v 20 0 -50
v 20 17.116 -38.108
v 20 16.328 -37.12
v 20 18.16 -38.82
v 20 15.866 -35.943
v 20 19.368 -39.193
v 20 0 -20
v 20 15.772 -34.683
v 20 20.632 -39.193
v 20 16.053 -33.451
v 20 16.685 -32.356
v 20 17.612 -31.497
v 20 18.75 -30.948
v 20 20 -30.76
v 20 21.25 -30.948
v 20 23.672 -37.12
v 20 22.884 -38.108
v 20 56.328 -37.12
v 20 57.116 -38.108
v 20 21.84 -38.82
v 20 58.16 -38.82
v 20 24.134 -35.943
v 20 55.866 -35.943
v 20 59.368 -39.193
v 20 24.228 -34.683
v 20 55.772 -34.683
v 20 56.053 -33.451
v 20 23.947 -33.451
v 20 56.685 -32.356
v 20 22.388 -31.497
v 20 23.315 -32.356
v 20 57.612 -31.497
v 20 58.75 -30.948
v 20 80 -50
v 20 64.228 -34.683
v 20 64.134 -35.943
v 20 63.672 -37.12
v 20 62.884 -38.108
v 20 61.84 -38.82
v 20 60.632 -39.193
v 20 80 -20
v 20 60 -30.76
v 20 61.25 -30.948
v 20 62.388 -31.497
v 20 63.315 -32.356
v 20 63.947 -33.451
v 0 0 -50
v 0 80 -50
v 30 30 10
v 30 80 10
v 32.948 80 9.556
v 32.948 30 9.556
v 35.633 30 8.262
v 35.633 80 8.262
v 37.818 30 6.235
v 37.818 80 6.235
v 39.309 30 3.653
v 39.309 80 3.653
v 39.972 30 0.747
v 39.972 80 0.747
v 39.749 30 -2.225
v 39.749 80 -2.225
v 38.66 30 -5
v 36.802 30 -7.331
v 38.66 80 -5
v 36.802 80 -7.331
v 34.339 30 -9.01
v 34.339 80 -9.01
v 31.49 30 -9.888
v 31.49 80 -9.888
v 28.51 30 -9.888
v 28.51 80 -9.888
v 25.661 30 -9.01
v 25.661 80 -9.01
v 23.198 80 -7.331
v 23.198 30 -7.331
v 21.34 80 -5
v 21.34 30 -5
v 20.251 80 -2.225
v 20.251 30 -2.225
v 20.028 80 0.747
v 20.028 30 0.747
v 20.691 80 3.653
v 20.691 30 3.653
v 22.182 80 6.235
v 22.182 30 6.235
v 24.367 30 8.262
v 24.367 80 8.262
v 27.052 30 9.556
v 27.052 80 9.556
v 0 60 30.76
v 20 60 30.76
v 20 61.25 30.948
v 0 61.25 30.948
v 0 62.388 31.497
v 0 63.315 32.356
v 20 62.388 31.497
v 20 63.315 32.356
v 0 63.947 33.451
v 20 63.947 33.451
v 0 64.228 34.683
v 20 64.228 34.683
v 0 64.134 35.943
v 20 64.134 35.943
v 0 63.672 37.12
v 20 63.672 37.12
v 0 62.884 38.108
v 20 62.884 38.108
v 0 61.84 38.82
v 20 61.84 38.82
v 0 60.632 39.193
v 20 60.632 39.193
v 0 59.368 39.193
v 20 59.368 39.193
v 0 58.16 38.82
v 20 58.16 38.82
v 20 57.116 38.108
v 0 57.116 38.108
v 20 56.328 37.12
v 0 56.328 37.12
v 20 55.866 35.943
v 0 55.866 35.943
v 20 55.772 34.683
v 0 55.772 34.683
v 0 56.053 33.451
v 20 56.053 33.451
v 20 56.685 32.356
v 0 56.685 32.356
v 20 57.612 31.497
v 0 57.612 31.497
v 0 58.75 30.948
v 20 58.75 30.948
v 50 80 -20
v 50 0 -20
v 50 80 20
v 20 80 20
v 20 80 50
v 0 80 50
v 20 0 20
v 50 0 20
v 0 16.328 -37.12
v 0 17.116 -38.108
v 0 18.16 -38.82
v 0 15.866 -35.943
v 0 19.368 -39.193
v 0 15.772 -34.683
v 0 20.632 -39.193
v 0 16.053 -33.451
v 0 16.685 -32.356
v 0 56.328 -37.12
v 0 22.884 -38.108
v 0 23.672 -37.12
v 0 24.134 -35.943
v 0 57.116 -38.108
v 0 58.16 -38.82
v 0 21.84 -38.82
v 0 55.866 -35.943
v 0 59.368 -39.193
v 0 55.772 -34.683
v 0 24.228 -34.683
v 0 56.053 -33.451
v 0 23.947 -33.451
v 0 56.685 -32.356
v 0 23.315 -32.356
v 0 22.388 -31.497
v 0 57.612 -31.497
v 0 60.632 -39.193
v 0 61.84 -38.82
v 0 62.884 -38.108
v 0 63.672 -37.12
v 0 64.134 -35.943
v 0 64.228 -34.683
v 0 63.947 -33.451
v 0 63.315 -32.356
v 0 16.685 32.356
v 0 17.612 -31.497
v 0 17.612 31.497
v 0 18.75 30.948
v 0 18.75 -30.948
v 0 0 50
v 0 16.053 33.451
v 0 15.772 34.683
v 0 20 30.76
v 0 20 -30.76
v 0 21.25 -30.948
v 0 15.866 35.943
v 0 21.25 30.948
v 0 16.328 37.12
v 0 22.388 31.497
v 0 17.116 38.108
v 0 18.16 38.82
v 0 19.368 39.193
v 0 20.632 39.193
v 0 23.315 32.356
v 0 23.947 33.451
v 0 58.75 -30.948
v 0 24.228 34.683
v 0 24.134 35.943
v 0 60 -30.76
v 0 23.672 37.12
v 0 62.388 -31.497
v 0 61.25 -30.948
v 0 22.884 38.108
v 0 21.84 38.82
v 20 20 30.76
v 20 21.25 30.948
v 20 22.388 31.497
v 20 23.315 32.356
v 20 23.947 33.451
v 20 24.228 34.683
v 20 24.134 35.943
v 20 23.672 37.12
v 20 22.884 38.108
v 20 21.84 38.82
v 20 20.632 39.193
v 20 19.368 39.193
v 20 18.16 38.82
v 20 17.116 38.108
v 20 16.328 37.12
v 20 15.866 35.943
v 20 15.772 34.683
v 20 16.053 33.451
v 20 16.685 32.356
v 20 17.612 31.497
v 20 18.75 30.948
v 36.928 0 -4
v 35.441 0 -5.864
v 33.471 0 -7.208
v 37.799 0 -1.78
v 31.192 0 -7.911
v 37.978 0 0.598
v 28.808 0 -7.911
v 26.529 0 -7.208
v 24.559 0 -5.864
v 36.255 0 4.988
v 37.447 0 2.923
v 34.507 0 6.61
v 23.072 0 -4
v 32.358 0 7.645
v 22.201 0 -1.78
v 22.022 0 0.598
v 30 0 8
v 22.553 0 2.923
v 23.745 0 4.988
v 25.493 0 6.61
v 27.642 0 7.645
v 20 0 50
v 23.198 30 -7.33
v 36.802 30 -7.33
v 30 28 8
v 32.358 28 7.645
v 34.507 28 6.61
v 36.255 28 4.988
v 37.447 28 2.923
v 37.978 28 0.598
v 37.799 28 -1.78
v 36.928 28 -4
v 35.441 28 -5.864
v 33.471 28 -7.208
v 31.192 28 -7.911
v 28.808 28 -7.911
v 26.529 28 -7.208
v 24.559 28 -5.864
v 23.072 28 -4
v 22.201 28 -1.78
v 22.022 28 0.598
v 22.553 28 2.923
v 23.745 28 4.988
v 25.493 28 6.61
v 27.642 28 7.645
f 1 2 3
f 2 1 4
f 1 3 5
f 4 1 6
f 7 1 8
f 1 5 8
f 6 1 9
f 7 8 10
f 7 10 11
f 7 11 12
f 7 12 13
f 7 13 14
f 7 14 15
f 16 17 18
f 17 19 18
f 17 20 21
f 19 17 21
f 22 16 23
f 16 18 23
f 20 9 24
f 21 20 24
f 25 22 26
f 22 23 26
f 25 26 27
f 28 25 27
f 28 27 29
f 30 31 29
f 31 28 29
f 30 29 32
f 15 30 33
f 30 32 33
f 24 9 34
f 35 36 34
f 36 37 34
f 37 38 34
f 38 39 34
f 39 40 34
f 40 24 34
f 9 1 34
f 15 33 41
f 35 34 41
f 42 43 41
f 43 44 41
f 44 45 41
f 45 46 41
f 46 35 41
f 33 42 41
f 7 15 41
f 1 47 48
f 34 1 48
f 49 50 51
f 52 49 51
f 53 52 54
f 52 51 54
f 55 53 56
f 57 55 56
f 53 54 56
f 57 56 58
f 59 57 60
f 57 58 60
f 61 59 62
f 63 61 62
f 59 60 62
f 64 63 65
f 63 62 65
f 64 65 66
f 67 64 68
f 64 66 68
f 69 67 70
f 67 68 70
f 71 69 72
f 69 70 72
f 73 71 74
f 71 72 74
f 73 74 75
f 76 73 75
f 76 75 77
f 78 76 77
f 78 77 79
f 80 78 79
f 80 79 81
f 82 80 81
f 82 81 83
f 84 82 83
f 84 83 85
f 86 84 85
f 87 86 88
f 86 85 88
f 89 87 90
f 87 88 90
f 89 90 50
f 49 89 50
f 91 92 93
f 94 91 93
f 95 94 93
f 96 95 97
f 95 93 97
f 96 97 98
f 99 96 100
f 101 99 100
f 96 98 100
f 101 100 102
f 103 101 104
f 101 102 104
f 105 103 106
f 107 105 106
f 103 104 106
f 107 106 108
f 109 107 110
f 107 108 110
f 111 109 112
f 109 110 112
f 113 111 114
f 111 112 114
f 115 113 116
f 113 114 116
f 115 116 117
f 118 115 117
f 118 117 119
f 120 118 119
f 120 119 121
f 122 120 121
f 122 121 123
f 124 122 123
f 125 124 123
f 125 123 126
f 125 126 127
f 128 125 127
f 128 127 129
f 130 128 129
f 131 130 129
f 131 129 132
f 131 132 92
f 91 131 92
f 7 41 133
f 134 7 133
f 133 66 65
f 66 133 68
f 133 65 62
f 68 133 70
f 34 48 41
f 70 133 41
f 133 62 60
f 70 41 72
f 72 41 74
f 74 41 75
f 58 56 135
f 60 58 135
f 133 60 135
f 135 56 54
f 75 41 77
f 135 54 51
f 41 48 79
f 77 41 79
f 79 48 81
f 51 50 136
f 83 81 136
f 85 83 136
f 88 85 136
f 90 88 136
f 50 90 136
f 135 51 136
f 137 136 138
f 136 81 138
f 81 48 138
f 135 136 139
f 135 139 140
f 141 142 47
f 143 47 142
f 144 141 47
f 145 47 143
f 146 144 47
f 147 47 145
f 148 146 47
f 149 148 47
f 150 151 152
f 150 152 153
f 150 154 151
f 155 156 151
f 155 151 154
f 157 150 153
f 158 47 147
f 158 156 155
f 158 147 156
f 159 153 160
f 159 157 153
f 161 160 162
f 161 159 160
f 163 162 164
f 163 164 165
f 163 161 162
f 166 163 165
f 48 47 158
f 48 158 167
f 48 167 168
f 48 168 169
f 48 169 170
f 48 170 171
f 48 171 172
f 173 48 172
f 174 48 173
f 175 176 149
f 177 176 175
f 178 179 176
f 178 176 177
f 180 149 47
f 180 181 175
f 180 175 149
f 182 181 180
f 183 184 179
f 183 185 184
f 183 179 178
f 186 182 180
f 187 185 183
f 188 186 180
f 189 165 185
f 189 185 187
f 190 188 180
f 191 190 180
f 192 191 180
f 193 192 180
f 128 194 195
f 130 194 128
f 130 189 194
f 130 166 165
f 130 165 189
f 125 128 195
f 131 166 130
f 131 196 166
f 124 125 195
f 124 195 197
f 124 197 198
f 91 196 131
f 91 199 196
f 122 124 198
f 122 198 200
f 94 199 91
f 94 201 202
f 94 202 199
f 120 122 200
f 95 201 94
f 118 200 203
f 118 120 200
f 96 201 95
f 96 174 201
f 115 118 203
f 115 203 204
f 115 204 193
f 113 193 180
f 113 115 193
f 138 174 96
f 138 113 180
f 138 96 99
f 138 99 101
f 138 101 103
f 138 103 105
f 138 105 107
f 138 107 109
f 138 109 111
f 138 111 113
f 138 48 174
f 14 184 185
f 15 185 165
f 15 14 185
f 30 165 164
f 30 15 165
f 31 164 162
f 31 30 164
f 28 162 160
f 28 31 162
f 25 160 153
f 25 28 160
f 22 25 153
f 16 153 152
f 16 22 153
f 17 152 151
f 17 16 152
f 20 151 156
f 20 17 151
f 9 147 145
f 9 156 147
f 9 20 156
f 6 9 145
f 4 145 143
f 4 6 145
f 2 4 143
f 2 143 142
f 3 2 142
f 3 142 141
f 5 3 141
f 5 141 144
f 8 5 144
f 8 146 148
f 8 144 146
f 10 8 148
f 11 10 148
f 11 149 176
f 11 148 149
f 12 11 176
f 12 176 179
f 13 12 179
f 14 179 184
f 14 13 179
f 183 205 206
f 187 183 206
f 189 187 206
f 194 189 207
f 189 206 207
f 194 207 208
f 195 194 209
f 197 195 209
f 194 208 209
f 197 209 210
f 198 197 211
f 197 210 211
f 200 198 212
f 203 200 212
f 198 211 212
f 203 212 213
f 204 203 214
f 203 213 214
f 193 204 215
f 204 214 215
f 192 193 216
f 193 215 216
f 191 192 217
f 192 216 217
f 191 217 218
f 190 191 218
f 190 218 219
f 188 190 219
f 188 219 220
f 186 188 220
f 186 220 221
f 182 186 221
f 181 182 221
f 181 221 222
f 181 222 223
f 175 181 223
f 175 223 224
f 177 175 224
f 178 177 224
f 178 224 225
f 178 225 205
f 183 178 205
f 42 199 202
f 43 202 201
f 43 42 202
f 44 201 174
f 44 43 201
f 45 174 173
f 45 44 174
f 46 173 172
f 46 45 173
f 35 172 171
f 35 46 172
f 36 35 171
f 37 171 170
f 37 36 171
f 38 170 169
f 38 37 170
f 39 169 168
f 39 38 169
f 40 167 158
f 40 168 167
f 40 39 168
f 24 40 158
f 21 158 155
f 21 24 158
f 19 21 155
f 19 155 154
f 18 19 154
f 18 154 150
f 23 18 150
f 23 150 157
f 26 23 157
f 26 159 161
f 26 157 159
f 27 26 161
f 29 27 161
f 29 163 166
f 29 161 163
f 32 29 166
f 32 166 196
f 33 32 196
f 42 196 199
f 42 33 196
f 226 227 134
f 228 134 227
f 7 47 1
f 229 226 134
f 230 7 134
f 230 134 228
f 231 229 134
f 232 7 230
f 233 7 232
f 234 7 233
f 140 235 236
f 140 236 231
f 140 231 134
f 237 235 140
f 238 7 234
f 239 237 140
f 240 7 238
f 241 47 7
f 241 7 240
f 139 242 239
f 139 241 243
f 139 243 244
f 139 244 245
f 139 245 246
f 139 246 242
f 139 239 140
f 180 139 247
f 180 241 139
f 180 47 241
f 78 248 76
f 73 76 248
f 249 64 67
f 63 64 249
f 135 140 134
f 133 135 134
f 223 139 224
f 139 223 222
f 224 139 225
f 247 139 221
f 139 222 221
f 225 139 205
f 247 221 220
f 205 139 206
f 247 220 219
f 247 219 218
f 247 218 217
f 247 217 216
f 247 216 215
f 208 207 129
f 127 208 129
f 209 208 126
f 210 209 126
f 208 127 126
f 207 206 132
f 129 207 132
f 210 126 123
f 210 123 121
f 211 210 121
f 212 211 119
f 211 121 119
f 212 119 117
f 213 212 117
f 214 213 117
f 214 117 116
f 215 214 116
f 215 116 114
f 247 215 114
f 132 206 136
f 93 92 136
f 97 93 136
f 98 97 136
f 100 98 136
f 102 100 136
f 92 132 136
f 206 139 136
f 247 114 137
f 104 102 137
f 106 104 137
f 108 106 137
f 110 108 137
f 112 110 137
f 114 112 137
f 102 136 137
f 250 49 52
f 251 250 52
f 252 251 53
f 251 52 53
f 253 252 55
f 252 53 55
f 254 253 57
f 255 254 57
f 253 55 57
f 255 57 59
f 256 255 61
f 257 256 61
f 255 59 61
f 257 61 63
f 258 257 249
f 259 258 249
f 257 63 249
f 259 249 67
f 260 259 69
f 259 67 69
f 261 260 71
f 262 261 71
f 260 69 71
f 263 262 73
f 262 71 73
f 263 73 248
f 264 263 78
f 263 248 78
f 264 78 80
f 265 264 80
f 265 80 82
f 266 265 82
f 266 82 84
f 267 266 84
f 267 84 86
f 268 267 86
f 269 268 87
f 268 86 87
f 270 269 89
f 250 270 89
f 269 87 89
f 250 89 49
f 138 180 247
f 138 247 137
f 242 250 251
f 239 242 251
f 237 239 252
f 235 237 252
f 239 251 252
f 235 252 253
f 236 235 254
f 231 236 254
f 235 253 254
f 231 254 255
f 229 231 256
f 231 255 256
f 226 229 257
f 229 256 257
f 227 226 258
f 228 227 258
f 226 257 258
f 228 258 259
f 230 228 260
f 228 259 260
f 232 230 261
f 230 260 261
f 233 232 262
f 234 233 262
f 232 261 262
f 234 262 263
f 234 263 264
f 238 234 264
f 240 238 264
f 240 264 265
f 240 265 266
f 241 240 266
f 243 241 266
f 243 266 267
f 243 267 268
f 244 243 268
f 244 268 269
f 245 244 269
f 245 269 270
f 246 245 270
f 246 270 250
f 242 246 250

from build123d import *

# Parameters (mm, degrees)
SKETCH1_W           = 50
SKETCH1_H           = 40
BOSS_EXTRUDE1_DEPTH = 80
SKETCH4_W           = 100
SKETCH4_H           = 80
BOSS_EXTRUDE2_DEPTH = 20
SKETCH5_R           = 4.24
SCREW_HOLE_DEPTH    = 99.994949366
SKETCH6_R           = 8
ROD_HOLE_DEPTH      = 107.77078252
SKETCH7_R           = 10
CUT_EXTRUDE5_DEPTH  = 50
CHAMFER2_SIZE       = 2


with BuildPart() as part:
    # Sketch1 → Boss-Extrude1 (new body)
    with BuildSketch(Plane(origin=(0, 0, 0), x_dir=(1, 0, 0), z_dir=(0, 1, 0))):
        with Locations((25, 0)):
            Rectangle(SKETCH1_W, SKETCH1_H)
    extrude(amount=BOSS_EXTRUDE1_DEPTH)

    # Sketch4 → Boss-Extrude2 (add)
    with BuildSketch(Plane.ZY):
        with Locations((0, 40)):
            Rectangle(SKETCH4_W, SKETCH4_H)
    extrude(amount=-BOSS_EXTRUDE2_DEPTH)

    # Sketch5 → screw hole (cut, through all)
    with BuildSketch(Plane(origin=(20, 0, 0), x_dir=(0, 0, -1), z_dir=(1, 0, 0))):
        with Locations((-35, 20)):
            Circle(SKETCH5_R)
        with Locations((-35, 60)):
            Circle(SKETCH5_R)
    screw_hole = extrude(amount=-SCREW_HOLE_DEPTH, mode=Mode.SUBTRACT)

    # Mirror1: screw hole across plane
    add(screw_hole.mirror(Plane.XY), mode=Mode.SUBTRACT)

    # Sketch6 → rod hole (cut, through all)
    with BuildSketch(Plane(origin=(0, 80, 0), x_dir=(1, 0, 0), z_dir=(0, 1, 0))):
        with Locations(Location((30, 0, 0), (0, 0, 270))):
            Circle(SKETCH6_R)
    extrude(amount=-ROD_HOLE_DEPTH, mode=Mode.SUBTRACT)

    # Sketch7 → Cut-Extrude5 (cut)
    with BuildSketch(Plane(origin=(0, 80, 0), x_dir=(1, 0, 0), z_dir=(0, 1, 0))):
        with Locations(Location((30, 0, 0), (0, 0, 270))):
            Circle(SKETCH7_R)
    extrude(amount=-CUT_EXTRUDE5_DEPTH, mode=Mode.SUBTRACT)

    # Chamfer2
    chamfer2_edges = [part.edges().sort_by_distance(p)[0] for p in [
        (30, 30, -8),
    ]]
    chamfer(chamfer2_edges, length=CHAMFER2_SIZE - 0.0001)  # a hair under: the kernel refuses the full size


solid = part.part
